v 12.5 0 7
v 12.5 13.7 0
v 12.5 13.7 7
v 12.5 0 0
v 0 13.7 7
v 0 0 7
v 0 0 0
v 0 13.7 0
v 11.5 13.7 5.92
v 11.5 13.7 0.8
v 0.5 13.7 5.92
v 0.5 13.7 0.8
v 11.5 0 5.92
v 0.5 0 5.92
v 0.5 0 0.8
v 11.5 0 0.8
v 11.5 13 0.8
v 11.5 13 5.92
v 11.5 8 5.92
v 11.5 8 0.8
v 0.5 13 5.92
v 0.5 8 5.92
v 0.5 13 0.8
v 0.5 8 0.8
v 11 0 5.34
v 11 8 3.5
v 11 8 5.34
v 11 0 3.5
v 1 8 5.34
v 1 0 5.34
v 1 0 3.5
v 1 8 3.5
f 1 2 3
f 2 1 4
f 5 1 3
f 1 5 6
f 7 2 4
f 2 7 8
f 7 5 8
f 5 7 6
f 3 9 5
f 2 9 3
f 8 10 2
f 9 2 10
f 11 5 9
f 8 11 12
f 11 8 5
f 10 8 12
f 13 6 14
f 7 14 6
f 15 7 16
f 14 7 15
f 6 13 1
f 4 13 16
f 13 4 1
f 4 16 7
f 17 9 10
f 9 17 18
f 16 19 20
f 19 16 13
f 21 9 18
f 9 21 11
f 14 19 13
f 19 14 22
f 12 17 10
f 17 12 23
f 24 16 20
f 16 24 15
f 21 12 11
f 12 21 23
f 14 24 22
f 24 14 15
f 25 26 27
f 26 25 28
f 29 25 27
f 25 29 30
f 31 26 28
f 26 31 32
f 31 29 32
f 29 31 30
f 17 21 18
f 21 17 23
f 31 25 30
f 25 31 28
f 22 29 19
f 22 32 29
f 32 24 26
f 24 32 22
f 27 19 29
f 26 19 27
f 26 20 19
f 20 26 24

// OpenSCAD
usb2a();

module usb2a(){


color("silver")
    difference(){
cube([12.5,13.7,7]);
translate([0.5,-1,0.8])
cube([11,16,5.12]);}
color("white")
translate([1,0,3.5])
cube([10,13,1.84]);
translate([0,8,0])
color("grey",0.5)
cube([12.5,5,7]);
}
